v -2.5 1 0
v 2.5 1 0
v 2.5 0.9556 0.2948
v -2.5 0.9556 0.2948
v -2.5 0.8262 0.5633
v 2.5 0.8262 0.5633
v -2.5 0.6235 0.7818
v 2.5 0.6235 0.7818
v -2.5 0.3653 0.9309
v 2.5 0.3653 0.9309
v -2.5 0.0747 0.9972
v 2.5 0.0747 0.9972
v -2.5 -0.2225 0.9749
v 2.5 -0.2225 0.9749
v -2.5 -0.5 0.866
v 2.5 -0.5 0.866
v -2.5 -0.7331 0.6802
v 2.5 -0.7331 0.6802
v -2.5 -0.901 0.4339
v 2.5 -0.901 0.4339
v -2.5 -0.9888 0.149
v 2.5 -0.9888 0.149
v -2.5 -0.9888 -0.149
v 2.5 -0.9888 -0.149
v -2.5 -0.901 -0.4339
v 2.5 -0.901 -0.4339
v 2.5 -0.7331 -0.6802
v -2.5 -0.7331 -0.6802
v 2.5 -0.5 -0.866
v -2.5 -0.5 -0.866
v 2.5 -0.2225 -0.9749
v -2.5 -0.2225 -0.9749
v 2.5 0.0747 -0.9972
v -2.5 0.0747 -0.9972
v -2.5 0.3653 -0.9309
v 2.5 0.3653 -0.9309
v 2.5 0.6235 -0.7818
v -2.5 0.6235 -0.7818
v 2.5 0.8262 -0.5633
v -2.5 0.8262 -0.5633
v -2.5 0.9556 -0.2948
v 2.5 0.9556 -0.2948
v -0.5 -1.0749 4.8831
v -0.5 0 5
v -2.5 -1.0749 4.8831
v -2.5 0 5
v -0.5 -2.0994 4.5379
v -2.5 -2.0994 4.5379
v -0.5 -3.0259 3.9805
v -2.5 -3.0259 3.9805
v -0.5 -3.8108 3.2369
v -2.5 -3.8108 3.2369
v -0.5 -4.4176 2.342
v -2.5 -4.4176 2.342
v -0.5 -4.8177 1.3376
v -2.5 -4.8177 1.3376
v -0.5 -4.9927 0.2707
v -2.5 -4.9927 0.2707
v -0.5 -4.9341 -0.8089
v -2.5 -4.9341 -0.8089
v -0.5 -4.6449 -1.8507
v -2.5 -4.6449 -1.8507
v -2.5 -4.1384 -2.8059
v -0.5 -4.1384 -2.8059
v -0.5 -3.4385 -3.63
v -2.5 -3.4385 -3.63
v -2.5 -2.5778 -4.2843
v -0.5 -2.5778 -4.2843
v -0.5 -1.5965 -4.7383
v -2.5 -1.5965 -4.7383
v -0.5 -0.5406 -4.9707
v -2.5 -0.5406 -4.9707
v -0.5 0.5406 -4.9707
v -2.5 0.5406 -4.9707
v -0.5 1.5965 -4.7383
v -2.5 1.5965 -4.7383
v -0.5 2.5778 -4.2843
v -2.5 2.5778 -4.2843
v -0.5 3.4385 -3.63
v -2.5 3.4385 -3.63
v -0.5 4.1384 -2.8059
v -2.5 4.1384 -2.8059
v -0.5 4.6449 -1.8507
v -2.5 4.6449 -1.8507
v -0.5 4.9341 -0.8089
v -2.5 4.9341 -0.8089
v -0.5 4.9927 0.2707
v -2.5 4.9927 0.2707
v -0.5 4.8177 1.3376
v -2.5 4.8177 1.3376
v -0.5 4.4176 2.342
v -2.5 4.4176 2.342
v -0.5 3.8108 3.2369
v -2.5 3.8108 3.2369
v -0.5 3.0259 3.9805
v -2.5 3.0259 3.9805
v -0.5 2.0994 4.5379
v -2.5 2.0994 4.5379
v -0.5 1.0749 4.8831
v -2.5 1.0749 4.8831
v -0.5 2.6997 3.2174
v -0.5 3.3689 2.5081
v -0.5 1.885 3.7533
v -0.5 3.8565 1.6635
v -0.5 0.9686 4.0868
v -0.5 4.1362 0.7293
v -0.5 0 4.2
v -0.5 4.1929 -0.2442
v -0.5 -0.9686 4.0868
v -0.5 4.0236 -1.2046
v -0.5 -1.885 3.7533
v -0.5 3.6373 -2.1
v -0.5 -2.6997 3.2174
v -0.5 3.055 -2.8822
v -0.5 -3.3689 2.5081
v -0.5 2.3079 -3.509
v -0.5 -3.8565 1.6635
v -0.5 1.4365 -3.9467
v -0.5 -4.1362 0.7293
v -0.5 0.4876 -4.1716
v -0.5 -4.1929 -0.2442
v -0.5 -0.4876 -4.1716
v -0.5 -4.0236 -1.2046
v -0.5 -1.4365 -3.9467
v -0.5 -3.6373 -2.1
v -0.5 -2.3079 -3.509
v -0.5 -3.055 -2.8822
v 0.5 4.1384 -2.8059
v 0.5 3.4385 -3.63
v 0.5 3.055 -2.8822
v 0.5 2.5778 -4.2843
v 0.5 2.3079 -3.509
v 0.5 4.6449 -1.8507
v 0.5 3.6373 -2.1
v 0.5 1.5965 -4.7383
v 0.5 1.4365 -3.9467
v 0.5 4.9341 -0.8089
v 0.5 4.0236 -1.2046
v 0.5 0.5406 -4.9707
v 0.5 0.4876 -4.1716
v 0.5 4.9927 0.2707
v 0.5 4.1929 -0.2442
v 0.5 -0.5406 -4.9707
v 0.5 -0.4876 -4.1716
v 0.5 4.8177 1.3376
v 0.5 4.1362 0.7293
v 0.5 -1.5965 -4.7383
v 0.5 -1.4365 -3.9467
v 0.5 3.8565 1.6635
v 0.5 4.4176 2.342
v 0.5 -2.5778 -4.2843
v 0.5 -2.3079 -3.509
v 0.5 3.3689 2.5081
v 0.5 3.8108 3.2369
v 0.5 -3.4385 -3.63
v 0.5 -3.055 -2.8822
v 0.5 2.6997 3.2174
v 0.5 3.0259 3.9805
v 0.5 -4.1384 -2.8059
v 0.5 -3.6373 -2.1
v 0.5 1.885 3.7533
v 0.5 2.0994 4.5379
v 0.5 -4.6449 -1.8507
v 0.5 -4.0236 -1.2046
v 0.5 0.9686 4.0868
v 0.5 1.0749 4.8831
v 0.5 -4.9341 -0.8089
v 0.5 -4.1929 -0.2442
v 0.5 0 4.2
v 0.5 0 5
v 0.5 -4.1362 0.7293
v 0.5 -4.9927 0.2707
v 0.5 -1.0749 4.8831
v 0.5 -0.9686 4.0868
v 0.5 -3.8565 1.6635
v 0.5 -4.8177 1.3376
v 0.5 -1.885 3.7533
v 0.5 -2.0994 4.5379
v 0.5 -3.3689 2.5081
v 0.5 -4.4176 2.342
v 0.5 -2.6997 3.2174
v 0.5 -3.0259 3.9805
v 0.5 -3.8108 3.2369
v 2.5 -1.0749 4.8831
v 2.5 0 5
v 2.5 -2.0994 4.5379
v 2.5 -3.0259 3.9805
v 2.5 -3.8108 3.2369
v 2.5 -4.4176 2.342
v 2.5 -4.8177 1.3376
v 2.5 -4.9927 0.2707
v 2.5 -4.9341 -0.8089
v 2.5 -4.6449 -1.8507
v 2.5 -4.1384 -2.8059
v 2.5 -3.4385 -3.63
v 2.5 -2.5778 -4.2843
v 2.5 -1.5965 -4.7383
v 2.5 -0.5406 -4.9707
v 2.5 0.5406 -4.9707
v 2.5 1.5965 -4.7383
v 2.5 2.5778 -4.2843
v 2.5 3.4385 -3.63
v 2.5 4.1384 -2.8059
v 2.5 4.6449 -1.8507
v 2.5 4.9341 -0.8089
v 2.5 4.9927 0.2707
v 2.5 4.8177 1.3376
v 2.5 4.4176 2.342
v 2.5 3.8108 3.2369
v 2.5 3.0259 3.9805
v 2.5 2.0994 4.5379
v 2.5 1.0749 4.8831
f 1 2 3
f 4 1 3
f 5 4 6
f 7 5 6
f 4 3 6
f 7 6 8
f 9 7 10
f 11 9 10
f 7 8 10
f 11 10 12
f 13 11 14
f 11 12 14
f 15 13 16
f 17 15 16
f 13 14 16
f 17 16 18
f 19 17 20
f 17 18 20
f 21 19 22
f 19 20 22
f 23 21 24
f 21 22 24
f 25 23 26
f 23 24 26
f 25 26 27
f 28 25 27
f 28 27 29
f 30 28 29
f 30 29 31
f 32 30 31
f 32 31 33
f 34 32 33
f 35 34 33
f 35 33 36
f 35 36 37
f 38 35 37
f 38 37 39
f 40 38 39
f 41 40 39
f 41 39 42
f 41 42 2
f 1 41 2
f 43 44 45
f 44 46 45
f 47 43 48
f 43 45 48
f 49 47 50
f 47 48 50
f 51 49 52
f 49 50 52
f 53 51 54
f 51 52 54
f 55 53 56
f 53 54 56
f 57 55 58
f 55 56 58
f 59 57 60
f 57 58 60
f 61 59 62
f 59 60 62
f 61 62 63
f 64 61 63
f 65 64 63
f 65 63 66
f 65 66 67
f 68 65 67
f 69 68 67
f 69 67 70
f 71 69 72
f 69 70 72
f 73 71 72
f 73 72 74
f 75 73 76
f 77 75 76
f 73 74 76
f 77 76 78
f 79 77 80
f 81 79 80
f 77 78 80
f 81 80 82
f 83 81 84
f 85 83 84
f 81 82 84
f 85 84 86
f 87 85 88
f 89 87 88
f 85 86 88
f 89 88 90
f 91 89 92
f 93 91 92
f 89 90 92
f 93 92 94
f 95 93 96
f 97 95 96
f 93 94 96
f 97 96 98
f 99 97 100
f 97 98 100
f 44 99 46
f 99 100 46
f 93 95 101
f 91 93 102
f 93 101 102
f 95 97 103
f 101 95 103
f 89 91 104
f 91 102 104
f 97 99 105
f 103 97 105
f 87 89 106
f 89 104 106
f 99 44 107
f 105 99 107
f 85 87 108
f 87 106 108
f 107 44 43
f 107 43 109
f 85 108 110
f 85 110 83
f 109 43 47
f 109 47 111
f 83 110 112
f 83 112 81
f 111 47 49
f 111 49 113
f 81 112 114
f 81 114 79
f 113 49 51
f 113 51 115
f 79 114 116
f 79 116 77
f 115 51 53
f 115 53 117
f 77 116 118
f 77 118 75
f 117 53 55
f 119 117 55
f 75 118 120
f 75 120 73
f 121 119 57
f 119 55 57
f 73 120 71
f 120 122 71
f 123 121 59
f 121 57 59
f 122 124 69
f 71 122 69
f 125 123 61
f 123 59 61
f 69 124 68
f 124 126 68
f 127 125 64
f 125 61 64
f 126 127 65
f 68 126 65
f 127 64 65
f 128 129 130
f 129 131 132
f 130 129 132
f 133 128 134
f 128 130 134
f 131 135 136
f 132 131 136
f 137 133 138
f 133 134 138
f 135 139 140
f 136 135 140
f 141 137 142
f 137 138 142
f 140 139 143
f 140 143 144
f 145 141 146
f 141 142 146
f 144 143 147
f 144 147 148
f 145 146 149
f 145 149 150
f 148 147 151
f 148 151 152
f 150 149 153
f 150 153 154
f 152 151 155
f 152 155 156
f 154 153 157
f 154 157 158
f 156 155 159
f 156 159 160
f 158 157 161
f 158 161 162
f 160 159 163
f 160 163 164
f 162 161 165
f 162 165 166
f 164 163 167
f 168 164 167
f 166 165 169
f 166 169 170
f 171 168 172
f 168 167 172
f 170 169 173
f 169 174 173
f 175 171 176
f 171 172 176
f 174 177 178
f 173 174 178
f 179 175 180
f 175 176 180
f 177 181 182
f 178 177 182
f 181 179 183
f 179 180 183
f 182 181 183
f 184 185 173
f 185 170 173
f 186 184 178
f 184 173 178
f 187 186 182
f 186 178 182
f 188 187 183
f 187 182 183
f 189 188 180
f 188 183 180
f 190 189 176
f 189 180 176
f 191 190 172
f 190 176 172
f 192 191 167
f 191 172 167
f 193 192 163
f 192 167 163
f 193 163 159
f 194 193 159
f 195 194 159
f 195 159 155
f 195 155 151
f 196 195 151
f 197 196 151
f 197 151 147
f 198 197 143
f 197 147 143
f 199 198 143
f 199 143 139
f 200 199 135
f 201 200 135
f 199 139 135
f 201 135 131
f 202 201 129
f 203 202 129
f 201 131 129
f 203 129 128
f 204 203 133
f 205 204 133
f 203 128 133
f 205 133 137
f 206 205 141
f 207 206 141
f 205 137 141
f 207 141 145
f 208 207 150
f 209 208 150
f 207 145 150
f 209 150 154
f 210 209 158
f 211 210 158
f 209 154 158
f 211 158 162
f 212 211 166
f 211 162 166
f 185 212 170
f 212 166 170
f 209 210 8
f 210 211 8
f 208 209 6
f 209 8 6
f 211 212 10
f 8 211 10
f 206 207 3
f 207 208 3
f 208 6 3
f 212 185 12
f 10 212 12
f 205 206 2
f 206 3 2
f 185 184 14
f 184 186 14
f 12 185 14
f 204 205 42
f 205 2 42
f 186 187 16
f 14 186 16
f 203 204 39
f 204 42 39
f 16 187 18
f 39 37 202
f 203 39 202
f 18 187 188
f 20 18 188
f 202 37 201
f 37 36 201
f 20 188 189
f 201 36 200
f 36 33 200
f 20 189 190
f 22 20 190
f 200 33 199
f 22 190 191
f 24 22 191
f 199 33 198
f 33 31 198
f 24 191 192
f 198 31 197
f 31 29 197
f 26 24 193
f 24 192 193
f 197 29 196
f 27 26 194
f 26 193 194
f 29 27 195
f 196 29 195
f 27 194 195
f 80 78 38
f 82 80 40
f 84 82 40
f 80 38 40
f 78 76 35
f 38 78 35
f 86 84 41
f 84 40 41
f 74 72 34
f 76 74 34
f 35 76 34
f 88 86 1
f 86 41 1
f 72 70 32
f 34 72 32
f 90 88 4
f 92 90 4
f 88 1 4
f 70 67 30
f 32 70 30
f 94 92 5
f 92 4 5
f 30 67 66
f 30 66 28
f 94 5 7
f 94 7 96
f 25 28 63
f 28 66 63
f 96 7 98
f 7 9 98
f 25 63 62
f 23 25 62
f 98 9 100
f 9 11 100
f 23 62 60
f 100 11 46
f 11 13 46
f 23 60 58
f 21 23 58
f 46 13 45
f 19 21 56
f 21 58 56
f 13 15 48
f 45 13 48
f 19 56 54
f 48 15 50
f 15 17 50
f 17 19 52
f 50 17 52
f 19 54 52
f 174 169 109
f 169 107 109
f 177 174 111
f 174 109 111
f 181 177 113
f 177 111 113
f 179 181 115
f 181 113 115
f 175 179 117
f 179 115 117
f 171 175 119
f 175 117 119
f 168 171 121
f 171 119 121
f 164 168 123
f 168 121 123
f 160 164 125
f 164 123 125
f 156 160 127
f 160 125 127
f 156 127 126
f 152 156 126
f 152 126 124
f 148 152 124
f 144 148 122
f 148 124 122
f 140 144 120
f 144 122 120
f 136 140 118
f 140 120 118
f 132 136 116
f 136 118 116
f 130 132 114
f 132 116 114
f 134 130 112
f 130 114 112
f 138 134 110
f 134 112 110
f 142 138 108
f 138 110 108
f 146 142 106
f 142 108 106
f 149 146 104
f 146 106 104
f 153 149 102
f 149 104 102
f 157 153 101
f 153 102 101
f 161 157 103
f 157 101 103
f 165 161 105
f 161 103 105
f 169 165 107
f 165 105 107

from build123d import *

# Parameters (mm, degrees)
F3_D = 2


with BuildPart() as f1:
    # F0 (on Front) → F1 (revolve)
    with BuildSketch(Plane.XZ):
        Polygon((-2.5, 5), (-2.5, 0), (2.5, 0), (2.5, 5), (0.5, 5), (0.5, 4.2), (-0.5, 4.2), (-0.5, 5), align=None)
    revolve(axis=Axis((0.0154641815, 0, 0), (1, 0, 0)))

    # F3 (through all)
    with Locations(Plane(origin=(-2.5, 0, 0), x_dir=(0, -1, 0), z_dir=(-1, 0, 0))):
        with Locations((0, 0)):
            Hole(F3_D / 2)


solid = f1.part
